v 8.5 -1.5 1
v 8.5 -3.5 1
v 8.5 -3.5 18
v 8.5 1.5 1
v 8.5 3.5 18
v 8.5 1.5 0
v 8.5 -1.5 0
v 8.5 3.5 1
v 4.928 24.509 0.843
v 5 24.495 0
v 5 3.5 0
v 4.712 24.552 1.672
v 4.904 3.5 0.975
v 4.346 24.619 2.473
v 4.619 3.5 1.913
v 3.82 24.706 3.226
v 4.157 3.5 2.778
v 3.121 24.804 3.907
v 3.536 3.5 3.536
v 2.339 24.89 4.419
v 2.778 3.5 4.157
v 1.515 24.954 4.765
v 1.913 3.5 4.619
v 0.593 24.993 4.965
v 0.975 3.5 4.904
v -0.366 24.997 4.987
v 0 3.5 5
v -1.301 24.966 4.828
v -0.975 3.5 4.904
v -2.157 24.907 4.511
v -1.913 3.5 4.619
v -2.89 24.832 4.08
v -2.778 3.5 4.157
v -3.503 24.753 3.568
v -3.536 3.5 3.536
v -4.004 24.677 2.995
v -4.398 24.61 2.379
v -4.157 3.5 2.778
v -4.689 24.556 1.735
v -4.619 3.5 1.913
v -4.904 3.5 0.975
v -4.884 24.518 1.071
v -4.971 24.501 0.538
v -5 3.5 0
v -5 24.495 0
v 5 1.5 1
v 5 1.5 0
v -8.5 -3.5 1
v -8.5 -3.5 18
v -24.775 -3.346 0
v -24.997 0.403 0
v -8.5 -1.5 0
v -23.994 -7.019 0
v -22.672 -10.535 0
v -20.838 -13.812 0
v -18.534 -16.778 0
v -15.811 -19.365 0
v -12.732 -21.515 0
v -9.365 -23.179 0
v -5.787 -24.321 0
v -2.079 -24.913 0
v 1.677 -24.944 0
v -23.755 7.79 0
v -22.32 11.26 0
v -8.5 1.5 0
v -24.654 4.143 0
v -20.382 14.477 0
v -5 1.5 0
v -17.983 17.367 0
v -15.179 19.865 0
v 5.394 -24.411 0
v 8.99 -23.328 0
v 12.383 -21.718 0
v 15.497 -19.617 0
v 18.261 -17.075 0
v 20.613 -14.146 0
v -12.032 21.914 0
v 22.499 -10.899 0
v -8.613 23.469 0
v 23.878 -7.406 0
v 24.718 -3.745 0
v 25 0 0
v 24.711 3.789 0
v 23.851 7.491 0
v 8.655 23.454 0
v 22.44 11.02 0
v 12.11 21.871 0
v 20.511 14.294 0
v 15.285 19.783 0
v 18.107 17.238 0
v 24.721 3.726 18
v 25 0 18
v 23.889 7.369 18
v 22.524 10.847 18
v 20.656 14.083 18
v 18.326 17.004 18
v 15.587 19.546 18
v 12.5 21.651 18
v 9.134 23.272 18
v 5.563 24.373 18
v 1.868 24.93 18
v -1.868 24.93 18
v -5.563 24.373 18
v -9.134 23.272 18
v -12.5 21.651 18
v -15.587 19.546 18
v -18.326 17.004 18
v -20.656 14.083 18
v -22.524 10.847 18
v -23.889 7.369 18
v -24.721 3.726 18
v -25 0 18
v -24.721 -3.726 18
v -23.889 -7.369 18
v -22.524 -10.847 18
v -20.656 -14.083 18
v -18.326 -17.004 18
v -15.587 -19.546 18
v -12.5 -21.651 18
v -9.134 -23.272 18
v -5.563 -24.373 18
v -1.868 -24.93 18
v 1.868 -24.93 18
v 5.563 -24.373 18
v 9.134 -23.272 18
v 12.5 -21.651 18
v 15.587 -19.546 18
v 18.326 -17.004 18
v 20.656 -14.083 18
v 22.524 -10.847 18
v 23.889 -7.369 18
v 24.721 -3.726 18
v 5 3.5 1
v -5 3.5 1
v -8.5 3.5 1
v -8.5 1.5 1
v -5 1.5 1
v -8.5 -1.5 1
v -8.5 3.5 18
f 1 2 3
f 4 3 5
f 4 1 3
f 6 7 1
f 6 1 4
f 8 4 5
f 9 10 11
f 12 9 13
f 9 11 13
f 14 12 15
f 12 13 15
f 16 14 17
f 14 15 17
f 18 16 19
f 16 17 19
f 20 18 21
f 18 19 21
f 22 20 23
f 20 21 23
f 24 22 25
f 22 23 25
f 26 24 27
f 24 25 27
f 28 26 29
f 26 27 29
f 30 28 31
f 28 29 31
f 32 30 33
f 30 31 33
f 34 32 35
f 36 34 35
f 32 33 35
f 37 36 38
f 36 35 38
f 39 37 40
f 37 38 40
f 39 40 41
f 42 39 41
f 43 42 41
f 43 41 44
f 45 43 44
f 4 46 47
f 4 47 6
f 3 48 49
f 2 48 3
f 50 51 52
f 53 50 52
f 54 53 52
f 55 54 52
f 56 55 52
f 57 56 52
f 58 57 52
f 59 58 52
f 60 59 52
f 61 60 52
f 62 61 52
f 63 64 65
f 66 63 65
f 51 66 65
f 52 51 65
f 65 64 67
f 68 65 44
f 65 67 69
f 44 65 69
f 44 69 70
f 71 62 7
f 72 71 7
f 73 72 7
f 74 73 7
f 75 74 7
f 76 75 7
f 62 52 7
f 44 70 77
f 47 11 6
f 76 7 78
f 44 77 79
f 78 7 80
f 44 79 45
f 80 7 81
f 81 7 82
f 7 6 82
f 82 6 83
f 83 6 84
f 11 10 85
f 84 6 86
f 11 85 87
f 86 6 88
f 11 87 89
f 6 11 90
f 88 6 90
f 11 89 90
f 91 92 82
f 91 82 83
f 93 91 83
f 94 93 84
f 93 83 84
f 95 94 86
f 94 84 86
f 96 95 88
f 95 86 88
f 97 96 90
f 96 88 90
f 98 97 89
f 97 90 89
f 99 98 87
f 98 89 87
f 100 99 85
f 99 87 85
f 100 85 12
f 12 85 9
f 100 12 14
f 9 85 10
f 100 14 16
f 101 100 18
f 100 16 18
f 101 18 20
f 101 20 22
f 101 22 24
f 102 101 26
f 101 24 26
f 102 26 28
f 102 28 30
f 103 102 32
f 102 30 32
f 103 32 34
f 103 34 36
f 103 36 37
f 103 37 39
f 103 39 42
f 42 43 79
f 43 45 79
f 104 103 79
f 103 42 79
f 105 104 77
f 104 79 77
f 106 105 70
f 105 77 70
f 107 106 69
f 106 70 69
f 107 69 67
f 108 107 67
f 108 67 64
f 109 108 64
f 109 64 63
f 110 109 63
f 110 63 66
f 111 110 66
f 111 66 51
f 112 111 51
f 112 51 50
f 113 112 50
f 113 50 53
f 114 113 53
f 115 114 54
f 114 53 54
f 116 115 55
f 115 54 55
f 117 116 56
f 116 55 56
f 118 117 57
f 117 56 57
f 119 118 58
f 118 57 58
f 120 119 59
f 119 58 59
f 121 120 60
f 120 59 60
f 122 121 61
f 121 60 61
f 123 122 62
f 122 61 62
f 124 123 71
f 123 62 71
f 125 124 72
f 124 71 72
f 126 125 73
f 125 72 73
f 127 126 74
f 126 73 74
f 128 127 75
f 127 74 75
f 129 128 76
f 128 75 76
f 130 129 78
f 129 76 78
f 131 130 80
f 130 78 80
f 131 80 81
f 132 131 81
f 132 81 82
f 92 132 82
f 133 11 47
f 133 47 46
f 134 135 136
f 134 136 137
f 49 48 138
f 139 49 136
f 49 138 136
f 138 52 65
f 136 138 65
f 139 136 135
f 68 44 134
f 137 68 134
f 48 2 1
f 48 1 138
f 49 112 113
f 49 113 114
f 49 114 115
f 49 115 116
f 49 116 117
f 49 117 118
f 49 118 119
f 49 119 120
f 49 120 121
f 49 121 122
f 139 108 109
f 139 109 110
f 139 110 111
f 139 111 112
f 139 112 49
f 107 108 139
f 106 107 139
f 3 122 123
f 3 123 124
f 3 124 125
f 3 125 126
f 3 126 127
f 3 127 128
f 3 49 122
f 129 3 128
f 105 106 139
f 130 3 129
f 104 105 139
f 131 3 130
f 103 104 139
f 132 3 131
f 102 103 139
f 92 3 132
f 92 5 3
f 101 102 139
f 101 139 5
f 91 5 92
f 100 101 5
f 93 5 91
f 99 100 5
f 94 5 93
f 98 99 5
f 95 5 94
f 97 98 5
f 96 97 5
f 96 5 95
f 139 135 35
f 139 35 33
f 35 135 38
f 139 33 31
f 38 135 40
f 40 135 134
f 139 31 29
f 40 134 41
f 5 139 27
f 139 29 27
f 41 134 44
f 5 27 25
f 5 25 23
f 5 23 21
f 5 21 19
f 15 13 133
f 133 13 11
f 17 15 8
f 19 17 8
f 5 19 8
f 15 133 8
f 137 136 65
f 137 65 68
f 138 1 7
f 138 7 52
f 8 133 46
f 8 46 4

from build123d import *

# Parameters (mm, degrees)
F0_R     = 25
F0_W     = 17
F0_H     = 7
F1_DEPTH = 18
F3_D     = 10
F3_DEPTH = 100
F3_TIP   = 3.0043030951
F4_W     = 17
F4_H     = 1
F5_DEPTH = 2
F6_W     = 3.5
F6_H     = 1
F7_DEPTH = 2


with BuildPart() as f1:
    # F0 (on Top) → F1 (new body)
    with BuildSketch(Plane.XY):
        Circle(F0_R)
        Rectangle(F0_W, F0_H, mode=Mode.SUBTRACT)
    extrude(amount=F1_DEPTH)

    # F3 (one way)
    with BuildSketch(Plane(origin=(0, -3.5, 0), x_dir=(-1, 0, 0), z_dir=(0, -1, 0))):
        with Locations((0, 0)):
            Circle(F3_D / 2)
    extrude(amount=-F3_DEPTH, mode=Mode.SUBTRACT)
    with Locations(Plane(origin=(0, -3.5, 0), x_dir=(-1, 0, 0), z_dir=(0, -1, 0))):
        with Locations((0, 0)):
            with Locations((0, 0, -(F3_DEPTH + F3_TIP / 2))):  # 118° drill point
                Cone(0, F3_D / 2, F3_TIP, mode=Mode.SUBTRACT)

    # F4 (on face) → F5 (join)
    with BuildSketch(Plane(origin=(0, -3.5, 0), x_dir=(-1, 0, 0), z_dir=(0, 1, 0))):
        with Locations((0, 0.5)):
            Rectangle(F4_W, F4_H)
    extrude(amount=F5_DEPTH)

    # F6 (on face) → F7 (join)
    with BuildSketch(Plane.XZ.offset(-3.5)):
        with Locations((-6.75, 0.5)):
            Rectangle(F6_W, F6_H)
        with Locations((6.75, 0.5)):
            Rectangle(F6_W, F6_H)
    extrude(amount=F7_DEPTH)


solid = f1.part
